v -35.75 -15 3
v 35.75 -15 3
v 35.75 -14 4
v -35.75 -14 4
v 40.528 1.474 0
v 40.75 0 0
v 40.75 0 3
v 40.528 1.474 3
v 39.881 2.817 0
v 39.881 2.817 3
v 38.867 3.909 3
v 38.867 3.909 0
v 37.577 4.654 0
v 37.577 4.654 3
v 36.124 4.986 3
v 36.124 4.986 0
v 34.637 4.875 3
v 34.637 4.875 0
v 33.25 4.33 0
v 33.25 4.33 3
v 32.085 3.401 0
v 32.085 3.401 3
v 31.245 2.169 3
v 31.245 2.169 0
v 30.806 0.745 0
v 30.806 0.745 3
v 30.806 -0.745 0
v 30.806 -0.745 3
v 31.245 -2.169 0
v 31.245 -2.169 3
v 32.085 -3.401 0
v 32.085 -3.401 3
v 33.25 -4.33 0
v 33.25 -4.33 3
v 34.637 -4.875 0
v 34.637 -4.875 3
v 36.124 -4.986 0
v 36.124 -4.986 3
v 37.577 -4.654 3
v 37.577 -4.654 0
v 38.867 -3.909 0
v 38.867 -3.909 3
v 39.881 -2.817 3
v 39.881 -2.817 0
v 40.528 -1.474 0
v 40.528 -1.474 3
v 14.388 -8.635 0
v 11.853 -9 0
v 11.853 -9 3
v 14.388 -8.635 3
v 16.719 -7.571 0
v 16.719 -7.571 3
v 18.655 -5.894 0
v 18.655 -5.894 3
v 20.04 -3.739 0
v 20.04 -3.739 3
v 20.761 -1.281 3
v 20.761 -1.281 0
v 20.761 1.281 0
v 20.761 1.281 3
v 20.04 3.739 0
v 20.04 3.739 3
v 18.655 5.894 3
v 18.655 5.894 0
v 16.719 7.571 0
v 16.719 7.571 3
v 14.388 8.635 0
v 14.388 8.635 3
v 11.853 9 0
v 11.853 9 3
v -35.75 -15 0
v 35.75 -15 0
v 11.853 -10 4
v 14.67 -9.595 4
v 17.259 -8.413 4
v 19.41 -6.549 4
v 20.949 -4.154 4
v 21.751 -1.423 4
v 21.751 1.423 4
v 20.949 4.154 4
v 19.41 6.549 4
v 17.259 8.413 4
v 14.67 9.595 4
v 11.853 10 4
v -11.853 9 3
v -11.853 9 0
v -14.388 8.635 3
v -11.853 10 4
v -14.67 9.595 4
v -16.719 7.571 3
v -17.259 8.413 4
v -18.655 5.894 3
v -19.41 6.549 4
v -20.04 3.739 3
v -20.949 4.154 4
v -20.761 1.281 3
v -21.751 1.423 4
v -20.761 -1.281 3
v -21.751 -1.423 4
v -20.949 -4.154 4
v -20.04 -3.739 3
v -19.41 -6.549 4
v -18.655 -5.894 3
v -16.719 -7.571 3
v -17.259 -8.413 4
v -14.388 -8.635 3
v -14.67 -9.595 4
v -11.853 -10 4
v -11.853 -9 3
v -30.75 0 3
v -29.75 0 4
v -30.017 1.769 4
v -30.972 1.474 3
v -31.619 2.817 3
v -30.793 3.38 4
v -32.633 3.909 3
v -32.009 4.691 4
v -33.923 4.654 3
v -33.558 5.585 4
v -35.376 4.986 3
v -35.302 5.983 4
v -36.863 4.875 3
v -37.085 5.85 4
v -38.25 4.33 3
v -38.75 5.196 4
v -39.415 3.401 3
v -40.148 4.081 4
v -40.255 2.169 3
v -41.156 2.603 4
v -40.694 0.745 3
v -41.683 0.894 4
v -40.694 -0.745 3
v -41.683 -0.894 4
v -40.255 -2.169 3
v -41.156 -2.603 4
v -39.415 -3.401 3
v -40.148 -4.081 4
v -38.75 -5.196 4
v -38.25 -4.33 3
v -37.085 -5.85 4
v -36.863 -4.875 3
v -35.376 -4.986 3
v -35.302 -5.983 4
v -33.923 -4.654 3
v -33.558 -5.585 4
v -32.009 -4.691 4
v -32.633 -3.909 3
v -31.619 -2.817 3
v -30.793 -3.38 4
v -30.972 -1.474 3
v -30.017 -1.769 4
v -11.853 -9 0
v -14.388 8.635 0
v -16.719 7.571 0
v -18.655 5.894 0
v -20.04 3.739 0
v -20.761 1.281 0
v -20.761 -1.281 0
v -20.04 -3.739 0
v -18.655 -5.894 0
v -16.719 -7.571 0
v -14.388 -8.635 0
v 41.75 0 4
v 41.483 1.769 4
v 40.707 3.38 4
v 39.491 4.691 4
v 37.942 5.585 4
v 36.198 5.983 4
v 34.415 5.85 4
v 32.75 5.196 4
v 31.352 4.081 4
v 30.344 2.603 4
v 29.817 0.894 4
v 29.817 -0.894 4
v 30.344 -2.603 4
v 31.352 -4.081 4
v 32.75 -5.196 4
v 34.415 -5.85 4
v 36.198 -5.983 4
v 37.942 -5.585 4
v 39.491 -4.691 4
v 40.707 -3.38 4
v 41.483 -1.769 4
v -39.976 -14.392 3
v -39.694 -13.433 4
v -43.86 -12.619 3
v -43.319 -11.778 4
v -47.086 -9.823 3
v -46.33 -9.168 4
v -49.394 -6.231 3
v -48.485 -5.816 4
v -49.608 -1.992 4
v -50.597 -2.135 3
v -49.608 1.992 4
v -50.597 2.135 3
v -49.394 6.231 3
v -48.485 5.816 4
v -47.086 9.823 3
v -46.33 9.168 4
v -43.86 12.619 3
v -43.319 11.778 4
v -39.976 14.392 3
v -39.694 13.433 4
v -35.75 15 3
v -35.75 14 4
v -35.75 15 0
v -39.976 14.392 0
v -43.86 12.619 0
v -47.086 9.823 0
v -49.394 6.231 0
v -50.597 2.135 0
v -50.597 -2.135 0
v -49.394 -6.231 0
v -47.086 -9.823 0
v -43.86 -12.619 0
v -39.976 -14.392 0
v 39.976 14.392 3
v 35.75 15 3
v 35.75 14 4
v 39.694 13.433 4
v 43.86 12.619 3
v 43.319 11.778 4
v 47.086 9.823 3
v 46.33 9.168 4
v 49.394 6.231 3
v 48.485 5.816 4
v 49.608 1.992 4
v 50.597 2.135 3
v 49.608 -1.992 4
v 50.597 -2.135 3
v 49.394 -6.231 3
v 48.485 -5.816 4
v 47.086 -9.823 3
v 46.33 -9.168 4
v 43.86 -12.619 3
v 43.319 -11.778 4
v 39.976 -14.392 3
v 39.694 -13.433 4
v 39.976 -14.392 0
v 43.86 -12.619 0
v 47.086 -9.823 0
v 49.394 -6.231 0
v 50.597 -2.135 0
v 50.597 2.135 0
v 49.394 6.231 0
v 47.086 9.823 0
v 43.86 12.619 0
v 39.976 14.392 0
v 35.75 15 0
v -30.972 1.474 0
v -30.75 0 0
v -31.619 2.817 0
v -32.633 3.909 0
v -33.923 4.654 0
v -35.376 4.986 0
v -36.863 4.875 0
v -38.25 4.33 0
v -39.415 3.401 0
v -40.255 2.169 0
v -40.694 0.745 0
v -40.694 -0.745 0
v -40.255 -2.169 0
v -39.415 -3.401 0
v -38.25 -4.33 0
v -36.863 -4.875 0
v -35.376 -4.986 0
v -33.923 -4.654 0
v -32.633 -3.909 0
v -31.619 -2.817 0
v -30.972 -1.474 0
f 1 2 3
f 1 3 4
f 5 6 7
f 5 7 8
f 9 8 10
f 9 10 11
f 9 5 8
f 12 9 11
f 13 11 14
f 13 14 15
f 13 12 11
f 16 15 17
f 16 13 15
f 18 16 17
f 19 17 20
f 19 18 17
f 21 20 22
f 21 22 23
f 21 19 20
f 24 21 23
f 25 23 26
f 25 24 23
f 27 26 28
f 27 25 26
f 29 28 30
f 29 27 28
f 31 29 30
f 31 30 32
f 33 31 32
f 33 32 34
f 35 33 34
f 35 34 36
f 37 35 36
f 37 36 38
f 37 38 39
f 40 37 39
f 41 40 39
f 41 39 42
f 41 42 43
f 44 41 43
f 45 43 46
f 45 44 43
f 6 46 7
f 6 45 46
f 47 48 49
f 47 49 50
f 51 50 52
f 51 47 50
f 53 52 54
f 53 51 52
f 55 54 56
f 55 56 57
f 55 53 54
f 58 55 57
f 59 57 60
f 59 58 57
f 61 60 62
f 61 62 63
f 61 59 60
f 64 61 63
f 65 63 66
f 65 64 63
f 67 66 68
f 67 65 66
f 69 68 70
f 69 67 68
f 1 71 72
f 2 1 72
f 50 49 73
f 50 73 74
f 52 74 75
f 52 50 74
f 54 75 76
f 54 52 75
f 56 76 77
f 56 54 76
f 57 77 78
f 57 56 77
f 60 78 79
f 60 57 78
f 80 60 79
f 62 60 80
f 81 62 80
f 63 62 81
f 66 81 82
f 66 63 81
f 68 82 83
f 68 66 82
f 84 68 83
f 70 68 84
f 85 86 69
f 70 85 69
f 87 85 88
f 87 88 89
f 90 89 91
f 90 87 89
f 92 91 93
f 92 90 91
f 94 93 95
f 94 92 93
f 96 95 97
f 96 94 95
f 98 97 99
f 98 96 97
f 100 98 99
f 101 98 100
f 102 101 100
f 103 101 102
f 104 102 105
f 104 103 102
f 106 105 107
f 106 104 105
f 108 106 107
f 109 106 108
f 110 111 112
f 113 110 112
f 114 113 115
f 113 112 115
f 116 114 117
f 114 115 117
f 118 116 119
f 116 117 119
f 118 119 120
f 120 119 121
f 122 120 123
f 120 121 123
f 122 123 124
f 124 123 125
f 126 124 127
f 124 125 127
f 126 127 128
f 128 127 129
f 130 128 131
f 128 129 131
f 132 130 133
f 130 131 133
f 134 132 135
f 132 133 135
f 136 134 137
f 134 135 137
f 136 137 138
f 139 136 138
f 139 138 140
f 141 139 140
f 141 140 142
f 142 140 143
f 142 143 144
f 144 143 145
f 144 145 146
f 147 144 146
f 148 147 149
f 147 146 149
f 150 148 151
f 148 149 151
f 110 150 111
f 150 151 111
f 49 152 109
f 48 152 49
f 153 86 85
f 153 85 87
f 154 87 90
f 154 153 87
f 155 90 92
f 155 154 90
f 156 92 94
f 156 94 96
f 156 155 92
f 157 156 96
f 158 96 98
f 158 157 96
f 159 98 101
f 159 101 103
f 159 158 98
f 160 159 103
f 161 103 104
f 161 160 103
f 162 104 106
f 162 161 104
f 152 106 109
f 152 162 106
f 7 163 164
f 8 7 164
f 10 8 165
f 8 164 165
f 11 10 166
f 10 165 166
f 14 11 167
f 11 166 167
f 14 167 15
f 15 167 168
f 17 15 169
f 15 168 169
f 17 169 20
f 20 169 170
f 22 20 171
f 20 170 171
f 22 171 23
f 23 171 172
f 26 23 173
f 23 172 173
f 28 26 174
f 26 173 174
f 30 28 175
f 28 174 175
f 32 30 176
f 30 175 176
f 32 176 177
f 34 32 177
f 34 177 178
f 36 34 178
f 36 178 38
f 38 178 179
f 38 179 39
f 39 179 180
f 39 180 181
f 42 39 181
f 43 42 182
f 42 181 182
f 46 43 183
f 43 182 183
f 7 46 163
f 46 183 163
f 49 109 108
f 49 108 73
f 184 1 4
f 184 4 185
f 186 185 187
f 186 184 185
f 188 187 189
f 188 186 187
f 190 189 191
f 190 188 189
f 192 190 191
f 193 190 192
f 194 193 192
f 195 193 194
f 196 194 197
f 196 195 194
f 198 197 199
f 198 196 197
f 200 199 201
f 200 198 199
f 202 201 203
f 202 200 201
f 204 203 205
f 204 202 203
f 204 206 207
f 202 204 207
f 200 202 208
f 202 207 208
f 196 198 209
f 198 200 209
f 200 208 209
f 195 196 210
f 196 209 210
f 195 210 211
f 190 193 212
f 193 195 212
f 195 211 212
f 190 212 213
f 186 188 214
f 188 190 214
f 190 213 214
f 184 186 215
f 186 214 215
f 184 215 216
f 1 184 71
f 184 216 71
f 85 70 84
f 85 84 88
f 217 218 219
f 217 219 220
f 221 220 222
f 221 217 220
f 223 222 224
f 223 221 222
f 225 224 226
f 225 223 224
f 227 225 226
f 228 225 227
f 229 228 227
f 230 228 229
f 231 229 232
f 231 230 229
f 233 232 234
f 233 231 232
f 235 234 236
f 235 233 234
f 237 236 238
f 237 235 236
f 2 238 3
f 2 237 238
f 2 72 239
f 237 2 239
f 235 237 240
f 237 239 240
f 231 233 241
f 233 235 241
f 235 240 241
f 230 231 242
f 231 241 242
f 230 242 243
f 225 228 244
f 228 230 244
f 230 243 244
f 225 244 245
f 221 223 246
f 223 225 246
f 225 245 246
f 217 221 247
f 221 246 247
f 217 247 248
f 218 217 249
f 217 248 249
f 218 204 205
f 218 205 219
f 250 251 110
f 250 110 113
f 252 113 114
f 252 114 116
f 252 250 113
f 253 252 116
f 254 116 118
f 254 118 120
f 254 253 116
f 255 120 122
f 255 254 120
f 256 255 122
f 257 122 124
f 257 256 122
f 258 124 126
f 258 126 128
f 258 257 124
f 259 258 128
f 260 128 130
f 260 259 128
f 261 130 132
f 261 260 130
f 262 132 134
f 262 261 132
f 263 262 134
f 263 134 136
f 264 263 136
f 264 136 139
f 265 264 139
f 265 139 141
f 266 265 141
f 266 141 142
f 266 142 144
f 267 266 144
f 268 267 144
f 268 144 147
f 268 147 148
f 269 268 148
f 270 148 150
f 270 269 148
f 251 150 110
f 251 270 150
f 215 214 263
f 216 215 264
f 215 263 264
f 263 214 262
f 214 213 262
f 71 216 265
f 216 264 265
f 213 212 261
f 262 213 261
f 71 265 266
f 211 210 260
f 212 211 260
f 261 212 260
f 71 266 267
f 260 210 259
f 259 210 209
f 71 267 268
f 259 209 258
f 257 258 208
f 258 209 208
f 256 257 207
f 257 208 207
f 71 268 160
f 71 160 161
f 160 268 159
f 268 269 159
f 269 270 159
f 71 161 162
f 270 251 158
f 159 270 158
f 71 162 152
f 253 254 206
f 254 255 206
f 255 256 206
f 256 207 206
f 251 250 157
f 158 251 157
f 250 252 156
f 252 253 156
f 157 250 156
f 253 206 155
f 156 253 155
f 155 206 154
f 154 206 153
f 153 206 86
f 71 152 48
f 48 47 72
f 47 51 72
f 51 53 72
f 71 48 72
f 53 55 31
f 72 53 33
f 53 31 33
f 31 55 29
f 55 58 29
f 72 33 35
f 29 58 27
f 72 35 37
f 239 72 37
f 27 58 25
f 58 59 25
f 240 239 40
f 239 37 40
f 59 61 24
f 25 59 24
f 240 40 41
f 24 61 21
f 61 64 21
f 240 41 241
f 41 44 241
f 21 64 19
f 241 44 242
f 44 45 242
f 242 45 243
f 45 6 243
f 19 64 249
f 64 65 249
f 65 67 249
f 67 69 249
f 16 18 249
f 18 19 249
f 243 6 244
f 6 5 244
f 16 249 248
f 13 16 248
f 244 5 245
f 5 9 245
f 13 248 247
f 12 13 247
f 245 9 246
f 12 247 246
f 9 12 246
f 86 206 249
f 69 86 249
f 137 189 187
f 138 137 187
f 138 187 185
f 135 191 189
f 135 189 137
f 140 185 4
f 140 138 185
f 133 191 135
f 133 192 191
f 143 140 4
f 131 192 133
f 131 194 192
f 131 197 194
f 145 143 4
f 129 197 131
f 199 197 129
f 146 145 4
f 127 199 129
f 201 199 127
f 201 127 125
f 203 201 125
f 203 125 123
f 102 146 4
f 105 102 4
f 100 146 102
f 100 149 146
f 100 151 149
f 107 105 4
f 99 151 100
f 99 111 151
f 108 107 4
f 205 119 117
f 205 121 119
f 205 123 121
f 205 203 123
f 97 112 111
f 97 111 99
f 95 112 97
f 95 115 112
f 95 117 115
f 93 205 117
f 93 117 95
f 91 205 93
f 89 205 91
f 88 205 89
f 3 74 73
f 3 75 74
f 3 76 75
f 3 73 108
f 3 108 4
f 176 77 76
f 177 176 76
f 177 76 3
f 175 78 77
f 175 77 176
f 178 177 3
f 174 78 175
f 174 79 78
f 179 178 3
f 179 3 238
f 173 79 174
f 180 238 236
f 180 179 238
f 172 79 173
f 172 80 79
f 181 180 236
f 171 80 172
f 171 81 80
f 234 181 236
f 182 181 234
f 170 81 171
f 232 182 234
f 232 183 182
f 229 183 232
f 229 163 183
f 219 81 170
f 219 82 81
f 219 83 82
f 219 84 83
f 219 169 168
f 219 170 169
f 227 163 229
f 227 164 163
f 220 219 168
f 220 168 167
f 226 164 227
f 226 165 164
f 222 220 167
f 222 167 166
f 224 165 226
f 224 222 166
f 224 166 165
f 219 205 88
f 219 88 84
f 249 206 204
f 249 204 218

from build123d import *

# Parameters (mm, degrees)
SKETCH_R        = 5
PAD_DEPTH       = 4
CHAMFER_SIZE    = 1
CHAMFER001_SIZE = 1
CHAMFER002_SIZE = 1


with BuildPart() as part:
    # Sketch → Pad (new body)
    with BuildSketch(Plane.XY):
        with BuildLine():
            ThreePointArc((-35.75, 15), (-50.75, 0), (-35.75, -15))
            Line((-35.75, -15), (35.75, -15))
            ThreePointArc((35.75, -15), (50.75, 0), (35.75, 15))
            Line((-35.75, 15), (35.75, 15))
        make_face()
        with Locations((-35.75, 0)):
            Circle(SKETCH_R, mode=Mode.SUBTRACT)
        with Locations((35.75, 0)):
            Circle(SKETCH_R, mode=Mode.SUBTRACT)
        with BuildLine():
            ThreePointArc((-11.85289, 9), (-20.85289, 0), (-11.85289, -9))
            Line((-11.85289, -9), (11.85289, -9))
            ThreePointArc((11.85289, -9), (20.85289, 0), (11.85289, 9))
            Line((-11.85289, 9), (11.85289, 9))
        make_face(mode=Mode.SUBTRACT)
    extrude(amount=PAD_DEPTH)

    # Chamfer
    chamfer_edges = [part.edges().sort_by_distance(p)[0] for p in [
        (-40.75, 0, 4),
        (30.75, 0, 4),
    ]]
    chamfer(chamfer_edges, length=CHAMFER_SIZE)

    # Chamfer001
    chamfer001_edges = [part.edges().sort_by_distance(p)[0] for p in [
        (0, 15, 4),
        (50.75, 0, 4),
        (0, -15, 4),
        (-50.75, 0, 4),
    ]]
    chamfer(chamfer001_edges, length=CHAMFER001_SIZE)

    # Chamfer002
    chamfer002_edges = [part.edges().sort_by_distance(p)[0] for p in [
        (20.85289, 0, 4),
        (0, -9, 4),
        (-20.85289, 0, 4),
        (0, 9, 4),
    ]]
    chamfer(chamfer002_edges, length=CHAMFER002_SIZE)


solid = part.part
